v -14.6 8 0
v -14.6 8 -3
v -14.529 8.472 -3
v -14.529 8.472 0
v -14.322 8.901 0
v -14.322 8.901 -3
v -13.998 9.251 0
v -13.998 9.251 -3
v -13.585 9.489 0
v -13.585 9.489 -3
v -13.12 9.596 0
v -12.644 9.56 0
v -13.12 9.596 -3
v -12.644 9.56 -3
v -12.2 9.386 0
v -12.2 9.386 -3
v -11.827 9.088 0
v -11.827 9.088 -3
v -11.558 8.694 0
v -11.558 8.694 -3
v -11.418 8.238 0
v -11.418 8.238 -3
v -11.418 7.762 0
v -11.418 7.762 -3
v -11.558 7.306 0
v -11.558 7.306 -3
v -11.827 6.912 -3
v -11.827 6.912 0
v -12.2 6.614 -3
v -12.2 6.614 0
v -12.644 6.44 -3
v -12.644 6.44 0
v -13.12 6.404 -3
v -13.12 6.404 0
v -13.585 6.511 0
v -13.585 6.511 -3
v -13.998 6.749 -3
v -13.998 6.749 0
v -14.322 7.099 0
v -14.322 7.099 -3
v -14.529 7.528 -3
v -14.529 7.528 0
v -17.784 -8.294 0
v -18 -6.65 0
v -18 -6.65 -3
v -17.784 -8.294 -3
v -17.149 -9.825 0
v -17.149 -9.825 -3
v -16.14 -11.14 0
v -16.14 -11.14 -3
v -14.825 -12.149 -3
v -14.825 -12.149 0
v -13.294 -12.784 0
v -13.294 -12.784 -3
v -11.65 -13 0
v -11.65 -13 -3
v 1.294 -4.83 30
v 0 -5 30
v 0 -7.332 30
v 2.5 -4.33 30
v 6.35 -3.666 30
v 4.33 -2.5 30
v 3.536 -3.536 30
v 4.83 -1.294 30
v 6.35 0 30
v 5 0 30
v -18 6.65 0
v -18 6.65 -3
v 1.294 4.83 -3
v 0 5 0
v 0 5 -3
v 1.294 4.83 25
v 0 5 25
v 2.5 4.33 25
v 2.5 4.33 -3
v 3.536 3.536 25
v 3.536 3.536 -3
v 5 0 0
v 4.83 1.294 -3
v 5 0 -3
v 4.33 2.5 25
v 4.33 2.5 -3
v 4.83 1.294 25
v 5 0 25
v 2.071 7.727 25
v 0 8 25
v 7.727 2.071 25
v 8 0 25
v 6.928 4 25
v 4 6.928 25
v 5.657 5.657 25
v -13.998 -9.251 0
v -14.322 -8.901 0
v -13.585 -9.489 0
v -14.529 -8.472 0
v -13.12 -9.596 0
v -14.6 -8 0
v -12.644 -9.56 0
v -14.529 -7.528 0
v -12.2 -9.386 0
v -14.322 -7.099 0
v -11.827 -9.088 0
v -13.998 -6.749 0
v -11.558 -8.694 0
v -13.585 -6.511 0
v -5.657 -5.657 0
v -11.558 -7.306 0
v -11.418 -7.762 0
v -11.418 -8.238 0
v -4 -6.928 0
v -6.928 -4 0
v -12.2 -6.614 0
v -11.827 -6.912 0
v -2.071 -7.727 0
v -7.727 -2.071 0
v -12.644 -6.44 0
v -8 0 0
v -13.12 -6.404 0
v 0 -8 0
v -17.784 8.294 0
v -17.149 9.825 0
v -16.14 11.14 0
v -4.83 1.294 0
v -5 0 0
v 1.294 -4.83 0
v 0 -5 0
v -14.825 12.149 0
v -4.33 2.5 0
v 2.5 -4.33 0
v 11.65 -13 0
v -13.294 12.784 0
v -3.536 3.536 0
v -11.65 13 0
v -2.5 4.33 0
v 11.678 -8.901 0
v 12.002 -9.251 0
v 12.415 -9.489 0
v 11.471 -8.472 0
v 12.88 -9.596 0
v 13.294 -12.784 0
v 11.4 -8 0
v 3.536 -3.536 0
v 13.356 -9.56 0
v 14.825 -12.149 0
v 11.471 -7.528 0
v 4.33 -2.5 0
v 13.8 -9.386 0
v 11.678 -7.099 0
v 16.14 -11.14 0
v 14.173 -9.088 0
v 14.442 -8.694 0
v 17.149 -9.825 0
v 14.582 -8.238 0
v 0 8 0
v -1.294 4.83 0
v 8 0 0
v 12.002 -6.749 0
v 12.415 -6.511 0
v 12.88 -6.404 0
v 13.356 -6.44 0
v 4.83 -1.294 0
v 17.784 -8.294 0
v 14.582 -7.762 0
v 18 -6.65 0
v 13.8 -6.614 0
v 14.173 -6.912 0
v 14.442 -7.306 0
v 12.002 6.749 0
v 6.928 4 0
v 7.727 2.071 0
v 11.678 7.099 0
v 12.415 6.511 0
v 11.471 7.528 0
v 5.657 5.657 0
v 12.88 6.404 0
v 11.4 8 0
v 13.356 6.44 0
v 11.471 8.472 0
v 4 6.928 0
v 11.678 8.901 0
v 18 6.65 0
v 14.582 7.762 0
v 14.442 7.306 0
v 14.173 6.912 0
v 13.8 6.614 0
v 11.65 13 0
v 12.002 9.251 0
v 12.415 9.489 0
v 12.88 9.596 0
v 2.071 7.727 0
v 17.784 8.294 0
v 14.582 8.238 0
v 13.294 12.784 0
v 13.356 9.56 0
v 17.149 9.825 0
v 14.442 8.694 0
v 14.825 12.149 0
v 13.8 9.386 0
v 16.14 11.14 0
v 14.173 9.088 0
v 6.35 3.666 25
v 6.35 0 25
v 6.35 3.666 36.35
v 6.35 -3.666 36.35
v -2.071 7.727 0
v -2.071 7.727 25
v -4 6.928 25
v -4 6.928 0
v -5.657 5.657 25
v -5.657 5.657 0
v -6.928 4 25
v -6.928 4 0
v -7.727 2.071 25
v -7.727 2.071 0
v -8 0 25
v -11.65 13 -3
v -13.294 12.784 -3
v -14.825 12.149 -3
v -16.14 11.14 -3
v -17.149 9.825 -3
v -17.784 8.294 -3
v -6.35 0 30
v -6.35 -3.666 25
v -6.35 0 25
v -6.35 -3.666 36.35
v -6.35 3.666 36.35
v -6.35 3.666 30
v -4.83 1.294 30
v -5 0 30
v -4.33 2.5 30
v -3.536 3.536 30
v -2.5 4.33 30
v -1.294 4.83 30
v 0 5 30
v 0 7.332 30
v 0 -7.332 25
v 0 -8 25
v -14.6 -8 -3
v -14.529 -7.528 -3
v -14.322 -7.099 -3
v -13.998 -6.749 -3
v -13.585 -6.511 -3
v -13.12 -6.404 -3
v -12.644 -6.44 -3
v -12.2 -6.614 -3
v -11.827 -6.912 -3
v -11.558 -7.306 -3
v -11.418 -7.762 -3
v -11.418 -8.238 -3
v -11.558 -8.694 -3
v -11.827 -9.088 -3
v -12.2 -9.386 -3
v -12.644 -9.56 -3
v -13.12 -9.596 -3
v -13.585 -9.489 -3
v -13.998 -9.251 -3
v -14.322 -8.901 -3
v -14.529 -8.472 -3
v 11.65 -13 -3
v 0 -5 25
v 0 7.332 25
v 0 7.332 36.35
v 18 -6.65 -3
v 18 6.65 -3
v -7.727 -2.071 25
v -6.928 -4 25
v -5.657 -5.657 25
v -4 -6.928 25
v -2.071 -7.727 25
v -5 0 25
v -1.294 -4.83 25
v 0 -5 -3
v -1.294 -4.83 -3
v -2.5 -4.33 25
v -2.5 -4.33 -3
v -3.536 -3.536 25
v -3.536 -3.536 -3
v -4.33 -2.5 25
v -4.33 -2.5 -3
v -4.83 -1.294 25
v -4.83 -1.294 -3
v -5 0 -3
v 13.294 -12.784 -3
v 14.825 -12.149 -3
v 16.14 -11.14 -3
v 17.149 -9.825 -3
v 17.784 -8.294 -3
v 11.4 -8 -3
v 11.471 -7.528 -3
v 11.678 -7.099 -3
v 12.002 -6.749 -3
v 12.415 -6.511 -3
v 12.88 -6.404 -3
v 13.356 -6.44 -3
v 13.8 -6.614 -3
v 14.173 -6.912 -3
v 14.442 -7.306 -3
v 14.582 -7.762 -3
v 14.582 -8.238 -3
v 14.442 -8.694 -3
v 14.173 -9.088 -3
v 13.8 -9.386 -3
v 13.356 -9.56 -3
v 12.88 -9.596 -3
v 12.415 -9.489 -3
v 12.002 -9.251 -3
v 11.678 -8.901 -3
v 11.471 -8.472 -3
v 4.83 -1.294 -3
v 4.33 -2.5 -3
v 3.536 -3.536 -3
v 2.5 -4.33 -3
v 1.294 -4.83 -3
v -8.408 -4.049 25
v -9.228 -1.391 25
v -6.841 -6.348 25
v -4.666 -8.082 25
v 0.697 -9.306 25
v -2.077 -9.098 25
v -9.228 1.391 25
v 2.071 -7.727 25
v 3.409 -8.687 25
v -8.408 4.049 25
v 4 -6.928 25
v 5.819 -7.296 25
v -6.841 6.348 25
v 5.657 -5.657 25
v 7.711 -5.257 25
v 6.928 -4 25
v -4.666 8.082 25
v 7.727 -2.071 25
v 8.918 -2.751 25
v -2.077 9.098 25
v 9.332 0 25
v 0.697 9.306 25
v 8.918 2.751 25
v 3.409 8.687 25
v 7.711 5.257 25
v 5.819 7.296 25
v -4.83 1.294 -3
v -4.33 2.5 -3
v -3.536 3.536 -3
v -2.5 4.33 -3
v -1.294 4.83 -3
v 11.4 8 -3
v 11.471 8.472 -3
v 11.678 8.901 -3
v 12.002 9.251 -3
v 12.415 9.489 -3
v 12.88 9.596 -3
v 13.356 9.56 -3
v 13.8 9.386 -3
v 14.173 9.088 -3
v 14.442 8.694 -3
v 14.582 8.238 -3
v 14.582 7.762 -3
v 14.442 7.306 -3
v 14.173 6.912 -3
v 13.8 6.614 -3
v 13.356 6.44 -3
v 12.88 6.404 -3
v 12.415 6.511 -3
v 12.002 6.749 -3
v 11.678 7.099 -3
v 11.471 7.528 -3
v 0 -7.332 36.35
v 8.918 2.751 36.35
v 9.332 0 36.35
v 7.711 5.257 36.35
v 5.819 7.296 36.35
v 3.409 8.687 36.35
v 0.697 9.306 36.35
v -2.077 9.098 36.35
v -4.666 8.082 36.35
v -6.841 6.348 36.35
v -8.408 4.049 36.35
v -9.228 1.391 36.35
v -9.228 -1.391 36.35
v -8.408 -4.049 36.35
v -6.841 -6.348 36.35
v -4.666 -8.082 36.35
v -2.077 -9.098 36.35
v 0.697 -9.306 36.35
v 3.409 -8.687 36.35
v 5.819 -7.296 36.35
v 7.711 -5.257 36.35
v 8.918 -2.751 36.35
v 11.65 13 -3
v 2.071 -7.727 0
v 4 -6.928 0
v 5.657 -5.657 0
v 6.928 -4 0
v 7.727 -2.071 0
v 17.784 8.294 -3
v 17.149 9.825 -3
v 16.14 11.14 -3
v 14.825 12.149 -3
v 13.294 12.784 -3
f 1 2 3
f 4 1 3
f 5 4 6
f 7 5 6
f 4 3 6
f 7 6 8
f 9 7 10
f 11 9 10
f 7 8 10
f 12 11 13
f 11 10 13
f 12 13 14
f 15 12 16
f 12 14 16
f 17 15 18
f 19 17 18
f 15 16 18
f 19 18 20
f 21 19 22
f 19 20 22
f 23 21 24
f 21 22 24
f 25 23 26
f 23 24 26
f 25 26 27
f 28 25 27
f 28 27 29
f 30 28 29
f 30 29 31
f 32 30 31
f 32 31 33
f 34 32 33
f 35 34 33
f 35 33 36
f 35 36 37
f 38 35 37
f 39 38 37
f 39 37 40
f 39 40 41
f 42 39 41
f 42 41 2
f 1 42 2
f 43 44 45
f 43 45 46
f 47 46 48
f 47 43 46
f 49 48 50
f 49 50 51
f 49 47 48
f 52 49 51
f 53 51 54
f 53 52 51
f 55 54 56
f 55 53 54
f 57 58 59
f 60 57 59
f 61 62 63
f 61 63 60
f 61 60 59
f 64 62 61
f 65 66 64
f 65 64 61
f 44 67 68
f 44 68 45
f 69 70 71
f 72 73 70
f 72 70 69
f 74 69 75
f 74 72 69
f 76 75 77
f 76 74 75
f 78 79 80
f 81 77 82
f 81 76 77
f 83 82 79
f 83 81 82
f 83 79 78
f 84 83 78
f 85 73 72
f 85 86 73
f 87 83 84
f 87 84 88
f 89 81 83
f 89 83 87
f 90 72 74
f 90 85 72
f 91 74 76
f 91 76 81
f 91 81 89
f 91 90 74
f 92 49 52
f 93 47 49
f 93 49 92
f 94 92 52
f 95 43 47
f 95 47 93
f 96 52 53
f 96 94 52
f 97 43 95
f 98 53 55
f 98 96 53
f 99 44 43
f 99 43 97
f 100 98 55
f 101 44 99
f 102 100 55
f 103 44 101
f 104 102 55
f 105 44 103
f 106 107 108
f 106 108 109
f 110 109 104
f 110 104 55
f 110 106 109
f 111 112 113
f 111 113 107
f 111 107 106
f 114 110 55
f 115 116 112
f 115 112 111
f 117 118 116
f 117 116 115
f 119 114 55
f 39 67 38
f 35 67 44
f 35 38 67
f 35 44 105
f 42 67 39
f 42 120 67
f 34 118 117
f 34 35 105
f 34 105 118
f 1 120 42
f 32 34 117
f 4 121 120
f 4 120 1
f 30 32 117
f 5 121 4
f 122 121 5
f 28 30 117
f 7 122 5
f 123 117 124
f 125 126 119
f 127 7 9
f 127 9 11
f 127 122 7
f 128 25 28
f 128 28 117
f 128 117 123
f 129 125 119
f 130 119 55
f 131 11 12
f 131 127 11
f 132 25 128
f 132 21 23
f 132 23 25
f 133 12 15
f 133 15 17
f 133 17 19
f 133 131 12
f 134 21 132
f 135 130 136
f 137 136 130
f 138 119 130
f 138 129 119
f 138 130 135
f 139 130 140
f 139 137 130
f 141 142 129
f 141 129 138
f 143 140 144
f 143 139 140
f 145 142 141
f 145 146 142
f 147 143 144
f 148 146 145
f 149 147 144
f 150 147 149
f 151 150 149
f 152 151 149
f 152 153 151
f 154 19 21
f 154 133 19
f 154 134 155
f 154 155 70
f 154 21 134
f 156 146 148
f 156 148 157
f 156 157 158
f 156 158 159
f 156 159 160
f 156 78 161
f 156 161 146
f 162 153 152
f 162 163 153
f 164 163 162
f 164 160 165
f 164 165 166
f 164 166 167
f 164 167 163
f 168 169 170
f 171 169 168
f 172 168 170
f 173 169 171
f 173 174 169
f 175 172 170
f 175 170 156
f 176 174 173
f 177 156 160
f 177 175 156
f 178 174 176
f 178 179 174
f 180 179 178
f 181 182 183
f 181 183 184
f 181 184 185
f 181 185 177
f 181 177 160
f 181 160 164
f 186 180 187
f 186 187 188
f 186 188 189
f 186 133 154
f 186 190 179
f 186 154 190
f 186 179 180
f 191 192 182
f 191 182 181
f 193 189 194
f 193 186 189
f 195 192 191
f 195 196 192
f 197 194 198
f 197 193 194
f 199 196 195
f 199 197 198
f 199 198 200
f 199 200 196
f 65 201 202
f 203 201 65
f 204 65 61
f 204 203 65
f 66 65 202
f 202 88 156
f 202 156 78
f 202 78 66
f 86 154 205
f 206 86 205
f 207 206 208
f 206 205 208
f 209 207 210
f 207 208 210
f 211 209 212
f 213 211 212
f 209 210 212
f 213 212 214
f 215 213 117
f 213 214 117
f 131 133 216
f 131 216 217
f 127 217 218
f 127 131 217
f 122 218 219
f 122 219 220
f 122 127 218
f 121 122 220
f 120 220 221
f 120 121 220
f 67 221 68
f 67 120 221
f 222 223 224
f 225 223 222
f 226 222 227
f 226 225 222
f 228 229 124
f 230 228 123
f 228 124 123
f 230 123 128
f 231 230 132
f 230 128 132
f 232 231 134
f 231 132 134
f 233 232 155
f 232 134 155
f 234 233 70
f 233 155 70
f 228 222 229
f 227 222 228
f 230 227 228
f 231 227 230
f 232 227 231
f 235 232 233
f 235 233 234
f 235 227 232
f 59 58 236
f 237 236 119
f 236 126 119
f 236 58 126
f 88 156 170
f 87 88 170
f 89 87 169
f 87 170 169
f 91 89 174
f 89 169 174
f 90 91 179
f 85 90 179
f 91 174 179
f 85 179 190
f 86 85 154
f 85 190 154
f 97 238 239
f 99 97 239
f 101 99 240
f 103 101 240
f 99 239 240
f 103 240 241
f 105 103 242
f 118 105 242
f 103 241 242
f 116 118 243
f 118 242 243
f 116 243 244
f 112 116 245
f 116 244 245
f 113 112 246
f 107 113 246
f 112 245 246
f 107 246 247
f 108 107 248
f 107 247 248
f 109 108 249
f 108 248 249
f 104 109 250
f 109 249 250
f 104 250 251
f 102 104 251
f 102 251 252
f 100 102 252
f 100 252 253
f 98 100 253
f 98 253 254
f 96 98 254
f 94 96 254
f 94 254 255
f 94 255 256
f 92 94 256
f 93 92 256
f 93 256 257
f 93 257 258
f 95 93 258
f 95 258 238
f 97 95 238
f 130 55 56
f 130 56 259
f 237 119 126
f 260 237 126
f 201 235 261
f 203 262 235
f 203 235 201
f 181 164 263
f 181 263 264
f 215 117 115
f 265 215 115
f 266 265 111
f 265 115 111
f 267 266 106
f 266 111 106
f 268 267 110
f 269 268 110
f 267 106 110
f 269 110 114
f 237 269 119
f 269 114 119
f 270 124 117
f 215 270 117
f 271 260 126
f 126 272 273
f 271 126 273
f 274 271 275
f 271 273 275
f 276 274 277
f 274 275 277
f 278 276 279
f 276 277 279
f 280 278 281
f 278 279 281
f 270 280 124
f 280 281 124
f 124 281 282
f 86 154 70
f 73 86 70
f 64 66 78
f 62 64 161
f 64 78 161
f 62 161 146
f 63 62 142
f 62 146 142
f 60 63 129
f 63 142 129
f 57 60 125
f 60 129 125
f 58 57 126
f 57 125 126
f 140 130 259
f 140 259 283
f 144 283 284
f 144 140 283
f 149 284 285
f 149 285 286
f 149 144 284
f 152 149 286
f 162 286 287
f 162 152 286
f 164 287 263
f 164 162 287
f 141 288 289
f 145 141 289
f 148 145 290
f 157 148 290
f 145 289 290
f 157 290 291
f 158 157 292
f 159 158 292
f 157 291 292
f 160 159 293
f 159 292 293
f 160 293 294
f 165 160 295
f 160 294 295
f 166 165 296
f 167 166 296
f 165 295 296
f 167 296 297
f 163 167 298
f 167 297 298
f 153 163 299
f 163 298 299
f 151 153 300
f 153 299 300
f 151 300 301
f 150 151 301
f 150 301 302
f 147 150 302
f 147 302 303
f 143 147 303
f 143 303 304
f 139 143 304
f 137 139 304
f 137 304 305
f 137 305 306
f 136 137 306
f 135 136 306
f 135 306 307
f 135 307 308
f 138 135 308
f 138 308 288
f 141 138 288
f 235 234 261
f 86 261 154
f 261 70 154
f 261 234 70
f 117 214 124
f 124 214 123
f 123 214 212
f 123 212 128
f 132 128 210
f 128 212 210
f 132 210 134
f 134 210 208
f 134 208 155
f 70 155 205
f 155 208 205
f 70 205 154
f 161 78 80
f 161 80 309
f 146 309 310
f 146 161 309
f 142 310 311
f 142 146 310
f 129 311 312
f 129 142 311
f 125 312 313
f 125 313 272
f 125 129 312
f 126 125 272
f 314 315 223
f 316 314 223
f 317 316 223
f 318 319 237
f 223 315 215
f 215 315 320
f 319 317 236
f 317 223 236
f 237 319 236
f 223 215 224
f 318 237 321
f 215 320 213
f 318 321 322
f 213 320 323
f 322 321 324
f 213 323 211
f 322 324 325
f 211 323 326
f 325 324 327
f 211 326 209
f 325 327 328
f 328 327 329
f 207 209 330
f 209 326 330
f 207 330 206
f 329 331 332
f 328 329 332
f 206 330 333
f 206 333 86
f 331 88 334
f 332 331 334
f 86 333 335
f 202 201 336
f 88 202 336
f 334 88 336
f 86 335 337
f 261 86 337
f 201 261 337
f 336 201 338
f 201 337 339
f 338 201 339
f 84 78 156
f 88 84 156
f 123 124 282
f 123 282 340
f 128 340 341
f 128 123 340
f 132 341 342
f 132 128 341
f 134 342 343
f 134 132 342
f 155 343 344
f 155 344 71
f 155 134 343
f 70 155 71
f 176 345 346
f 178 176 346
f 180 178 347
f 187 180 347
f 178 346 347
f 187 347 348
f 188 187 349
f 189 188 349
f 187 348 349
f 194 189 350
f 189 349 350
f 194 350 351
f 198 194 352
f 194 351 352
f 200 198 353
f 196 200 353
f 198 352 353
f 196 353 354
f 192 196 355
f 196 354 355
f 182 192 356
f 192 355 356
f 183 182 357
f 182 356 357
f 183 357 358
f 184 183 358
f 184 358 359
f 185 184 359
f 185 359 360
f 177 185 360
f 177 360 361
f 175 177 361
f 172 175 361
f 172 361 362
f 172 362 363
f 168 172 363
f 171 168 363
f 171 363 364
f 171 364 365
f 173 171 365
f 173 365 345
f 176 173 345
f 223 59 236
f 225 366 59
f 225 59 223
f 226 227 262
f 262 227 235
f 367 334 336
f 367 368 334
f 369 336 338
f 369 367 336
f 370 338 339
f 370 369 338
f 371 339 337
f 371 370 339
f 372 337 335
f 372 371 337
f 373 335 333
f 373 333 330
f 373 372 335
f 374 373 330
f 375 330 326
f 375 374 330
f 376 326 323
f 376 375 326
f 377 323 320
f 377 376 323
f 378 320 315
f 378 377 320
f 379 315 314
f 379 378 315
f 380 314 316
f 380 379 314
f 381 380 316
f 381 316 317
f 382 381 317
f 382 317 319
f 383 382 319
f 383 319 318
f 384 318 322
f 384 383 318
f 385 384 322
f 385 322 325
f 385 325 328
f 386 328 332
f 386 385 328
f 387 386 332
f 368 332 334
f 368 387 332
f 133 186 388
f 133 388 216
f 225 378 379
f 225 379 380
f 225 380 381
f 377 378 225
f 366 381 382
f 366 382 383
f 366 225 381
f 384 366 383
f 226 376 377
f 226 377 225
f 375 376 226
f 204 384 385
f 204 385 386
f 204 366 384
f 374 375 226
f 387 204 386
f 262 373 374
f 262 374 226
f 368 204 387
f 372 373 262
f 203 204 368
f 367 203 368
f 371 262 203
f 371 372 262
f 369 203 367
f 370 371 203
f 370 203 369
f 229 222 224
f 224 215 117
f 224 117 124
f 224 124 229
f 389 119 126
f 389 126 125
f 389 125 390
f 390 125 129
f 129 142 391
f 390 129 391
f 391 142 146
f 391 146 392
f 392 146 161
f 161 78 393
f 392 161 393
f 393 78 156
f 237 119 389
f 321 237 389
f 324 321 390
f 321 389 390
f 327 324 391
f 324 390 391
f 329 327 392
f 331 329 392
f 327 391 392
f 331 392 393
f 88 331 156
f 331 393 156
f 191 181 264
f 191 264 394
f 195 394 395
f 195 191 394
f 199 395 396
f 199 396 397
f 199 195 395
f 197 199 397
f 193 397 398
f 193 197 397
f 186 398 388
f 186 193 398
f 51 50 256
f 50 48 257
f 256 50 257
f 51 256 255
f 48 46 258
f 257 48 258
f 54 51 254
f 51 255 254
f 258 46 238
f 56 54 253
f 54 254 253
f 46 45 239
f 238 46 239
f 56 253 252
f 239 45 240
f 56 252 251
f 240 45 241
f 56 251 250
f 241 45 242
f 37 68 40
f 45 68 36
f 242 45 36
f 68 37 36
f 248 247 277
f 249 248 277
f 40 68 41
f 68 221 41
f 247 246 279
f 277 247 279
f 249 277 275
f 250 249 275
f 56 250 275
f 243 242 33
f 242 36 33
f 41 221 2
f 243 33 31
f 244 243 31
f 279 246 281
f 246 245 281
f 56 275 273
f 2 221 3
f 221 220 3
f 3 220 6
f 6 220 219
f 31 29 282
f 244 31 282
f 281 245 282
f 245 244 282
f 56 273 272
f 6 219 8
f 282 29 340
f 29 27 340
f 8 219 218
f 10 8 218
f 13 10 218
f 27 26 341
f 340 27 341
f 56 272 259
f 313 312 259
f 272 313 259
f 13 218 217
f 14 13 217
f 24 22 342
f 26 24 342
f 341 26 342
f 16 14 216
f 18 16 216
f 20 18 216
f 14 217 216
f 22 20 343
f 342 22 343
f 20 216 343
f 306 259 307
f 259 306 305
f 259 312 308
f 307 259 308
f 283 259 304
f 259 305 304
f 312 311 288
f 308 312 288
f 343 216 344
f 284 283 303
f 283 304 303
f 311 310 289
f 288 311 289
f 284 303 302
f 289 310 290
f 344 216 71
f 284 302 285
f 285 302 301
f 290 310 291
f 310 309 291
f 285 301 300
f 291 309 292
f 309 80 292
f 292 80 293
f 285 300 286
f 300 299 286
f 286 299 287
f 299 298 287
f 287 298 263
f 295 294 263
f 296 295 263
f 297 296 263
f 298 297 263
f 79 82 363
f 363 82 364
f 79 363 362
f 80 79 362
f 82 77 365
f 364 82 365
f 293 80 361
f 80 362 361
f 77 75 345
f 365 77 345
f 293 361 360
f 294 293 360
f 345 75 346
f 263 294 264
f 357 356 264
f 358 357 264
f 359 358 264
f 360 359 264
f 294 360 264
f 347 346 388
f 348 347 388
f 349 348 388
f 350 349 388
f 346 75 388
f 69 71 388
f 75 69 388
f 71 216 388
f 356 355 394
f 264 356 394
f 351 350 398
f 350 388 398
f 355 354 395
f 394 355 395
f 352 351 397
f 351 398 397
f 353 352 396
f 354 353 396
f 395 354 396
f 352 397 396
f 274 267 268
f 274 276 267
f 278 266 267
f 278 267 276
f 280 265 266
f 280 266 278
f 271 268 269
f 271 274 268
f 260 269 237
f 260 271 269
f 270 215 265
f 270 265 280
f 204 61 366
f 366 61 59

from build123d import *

# Parameters (mm, degrees)
F1_DEPTH = 3
F2_DEPTH = 25
F3_DEPTH = 30
F4_D     = 3.2
F5_R     = 9.3323484187
F6_DEPTH = 6.35
F7_DEPTH = 5


with BuildPart() as f1:
    # F0 (on Top) → F1 (new body)
    with BuildSketch(Plane.XY):
        with BuildLine():
            Line((-18, 6.65), (-18, -6.65))
            ThreePointArc((-18, -6.65), (-16.1401280605, -11.1401280605), (-11.65, -13))
            Line((-11.65, -13), (11.65, -13))
            ThreePointArc((11.65, -13), (16.1401280605, -11.1401280605), (18, -6.65))
            Line((18, -6.65), (18, 6.65))
            ThreePointArc((18, 6.65), (16.1401280605, 11.1401280605), (11.65, 13))
            Line((11.65, 13), (-11.65, 13))
            ThreePointArc((-11.65, 13), (-16.1401280605, 11.1401280605), (-18, 6.65))
        make_face()
        with BuildLine():
            ThreePointArc((0, 8), (5.6568542495, 5.6568542495), (8, 0))
            ThreePointArc((8, 0), (5.6568542495, -5.6568542495), (0, -8))
            ThreePointArc((0, -8), (-5.6568542495, -5.6568542495), (-8, 0))
            ThreePointArc((-8, 0), (-5.6568542495, 5.6568542495), (0, 8))
        make_face(mode=Mode.SUBTRACT)
        with BuildLine():
            ThreePointArc((0, 5), (3.5355339059, 3.5355339059), (5, 0))
            Line((5, 0), (8, 0))
            ThreePointArc((8, 0), (5.6568542495, 5.6568542495), (0, 8))
            Line((0, 8), (0, 5))
        make_face()
        with BuildLine():
            ThreePointArc((-5, 0), (-3.5355339059, 3.5355339059), (0, 5))
            Line((0, 5), (0, 8))
            ThreePointArc((0, 8), (-5.6568542495, 5.6568542495), (-8, 0))
            Line((-8, 0), (-5, 0))
        make_face()
        with BuildLine():
            Line((0, -8), (0, -5))
            ThreePointArc((0, -5), (-3.5355339059, -3.5355339059), (-5, 0))
            Line((-5, 0), (-8, 0))
            ThreePointArc((-8, 0), (-5.6568542495, -5.6568542495), (0, -8))
        make_face()
        with BuildLine():
            Line((8, 0), (5, 0))
            ThreePointArc((5, 0), (3.5355339059, -3.5355339059), (0, -5))
            Line((0, -5), (0, -8))
            ThreePointArc((0, -8), (5.6568542495, -5.6568542495), (8, 0))
        make_face()
    extrude(amount=-F1_DEPTH)

    # F0 (on Top) → F2 (join)
    with BuildSketch(Plane.XY):
        with BuildLine():
            Line((0, -8), (0, -5))
            ThreePointArc((0, -5), (-3.5355339059, -3.5355339059), (-5, 0))
            Line((-5, 0), (-8, 0))
            ThreePointArc((-8, 0), (-5.6568542495, -5.6568542495), (0, -8))
        make_face()
        with BuildLine():
            ThreePointArc((0, 5), (3.5355339059, 3.5355339059), (5, 0))
            Line((5, 0), (8, 0))
            ThreePointArc((8, 0), (5.6568542495, 5.6568542495), (0, 8))
            Line((0, 8), (0, 5))
        make_face()
    extrude(amount=F2_DEPTH)

    # F4 (through all)
    with Locations(Plane.XY):
        with Locations((13, -8), (13, 8), (-13, 8), (-13, -8)):
            Hole(F4_D / 2)


with BuildPart() as f3:
    # F0 (on Top) → F3 (new body)
    with BuildSketch(Plane.XY):
        with BuildLine():
            Line((8, 0), (5, 0))
            ThreePointArc((5, 0), (3.5355339059, -3.5355339059), (0, -5))
            Line((0, -5), (0, -8))
            ThreePointArc((0, -8), (5.6568542495, -5.6568542495), (8, 0))
        make_face()
    extrude(amount=F3_DEPTH)



with BuildPart() as f3b:
    # F0 (on Top) → F3, piece 2 (new body)
    with BuildSketch(Plane.XY):
        with BuildLine():
            ThreePointArc((-5, 0), (-3.5355339059, 3.5355339059), (0, 5))
            Line((0, 5), (0, 8))
            ThreePointArc((0, 8), (-5.6568542495, 5.6568542495), (-8, 0))
            Line((-8, 0), (-5, 0))
        make_face()
    extrude(amount=F3_DEPTH)


with BuildPart() as f3_1:
    add(f3.part)

    add(f3b.part)  # F6 merges F3b
    # F5 (on face) → F6 (join)
    with BuildSketch(Plane.XY.offset(30)):
        Circle(F5_R)
        Polygon((0, 7.3323484187), (6.35, 3.6661742094), (6.35, -3.6661742094), (0, -7.3323484187), (-6.35, -3.6661742094), (-6.35, 3.6661742094), align=None, mode=Mode.SUBTRACT)
    extrude(amount=F6_DEPTH)

    # F7 (add): a face of the model
    f7_faces = [f3_1.faces().sort_by_distance(p)[0] for p in [
        (-9.0683897447, 0, 30),
    ]]
    extrude(f7_faces, amount=F7_DEPTH)


solid = Compound([f1.part, f3_1.part])
